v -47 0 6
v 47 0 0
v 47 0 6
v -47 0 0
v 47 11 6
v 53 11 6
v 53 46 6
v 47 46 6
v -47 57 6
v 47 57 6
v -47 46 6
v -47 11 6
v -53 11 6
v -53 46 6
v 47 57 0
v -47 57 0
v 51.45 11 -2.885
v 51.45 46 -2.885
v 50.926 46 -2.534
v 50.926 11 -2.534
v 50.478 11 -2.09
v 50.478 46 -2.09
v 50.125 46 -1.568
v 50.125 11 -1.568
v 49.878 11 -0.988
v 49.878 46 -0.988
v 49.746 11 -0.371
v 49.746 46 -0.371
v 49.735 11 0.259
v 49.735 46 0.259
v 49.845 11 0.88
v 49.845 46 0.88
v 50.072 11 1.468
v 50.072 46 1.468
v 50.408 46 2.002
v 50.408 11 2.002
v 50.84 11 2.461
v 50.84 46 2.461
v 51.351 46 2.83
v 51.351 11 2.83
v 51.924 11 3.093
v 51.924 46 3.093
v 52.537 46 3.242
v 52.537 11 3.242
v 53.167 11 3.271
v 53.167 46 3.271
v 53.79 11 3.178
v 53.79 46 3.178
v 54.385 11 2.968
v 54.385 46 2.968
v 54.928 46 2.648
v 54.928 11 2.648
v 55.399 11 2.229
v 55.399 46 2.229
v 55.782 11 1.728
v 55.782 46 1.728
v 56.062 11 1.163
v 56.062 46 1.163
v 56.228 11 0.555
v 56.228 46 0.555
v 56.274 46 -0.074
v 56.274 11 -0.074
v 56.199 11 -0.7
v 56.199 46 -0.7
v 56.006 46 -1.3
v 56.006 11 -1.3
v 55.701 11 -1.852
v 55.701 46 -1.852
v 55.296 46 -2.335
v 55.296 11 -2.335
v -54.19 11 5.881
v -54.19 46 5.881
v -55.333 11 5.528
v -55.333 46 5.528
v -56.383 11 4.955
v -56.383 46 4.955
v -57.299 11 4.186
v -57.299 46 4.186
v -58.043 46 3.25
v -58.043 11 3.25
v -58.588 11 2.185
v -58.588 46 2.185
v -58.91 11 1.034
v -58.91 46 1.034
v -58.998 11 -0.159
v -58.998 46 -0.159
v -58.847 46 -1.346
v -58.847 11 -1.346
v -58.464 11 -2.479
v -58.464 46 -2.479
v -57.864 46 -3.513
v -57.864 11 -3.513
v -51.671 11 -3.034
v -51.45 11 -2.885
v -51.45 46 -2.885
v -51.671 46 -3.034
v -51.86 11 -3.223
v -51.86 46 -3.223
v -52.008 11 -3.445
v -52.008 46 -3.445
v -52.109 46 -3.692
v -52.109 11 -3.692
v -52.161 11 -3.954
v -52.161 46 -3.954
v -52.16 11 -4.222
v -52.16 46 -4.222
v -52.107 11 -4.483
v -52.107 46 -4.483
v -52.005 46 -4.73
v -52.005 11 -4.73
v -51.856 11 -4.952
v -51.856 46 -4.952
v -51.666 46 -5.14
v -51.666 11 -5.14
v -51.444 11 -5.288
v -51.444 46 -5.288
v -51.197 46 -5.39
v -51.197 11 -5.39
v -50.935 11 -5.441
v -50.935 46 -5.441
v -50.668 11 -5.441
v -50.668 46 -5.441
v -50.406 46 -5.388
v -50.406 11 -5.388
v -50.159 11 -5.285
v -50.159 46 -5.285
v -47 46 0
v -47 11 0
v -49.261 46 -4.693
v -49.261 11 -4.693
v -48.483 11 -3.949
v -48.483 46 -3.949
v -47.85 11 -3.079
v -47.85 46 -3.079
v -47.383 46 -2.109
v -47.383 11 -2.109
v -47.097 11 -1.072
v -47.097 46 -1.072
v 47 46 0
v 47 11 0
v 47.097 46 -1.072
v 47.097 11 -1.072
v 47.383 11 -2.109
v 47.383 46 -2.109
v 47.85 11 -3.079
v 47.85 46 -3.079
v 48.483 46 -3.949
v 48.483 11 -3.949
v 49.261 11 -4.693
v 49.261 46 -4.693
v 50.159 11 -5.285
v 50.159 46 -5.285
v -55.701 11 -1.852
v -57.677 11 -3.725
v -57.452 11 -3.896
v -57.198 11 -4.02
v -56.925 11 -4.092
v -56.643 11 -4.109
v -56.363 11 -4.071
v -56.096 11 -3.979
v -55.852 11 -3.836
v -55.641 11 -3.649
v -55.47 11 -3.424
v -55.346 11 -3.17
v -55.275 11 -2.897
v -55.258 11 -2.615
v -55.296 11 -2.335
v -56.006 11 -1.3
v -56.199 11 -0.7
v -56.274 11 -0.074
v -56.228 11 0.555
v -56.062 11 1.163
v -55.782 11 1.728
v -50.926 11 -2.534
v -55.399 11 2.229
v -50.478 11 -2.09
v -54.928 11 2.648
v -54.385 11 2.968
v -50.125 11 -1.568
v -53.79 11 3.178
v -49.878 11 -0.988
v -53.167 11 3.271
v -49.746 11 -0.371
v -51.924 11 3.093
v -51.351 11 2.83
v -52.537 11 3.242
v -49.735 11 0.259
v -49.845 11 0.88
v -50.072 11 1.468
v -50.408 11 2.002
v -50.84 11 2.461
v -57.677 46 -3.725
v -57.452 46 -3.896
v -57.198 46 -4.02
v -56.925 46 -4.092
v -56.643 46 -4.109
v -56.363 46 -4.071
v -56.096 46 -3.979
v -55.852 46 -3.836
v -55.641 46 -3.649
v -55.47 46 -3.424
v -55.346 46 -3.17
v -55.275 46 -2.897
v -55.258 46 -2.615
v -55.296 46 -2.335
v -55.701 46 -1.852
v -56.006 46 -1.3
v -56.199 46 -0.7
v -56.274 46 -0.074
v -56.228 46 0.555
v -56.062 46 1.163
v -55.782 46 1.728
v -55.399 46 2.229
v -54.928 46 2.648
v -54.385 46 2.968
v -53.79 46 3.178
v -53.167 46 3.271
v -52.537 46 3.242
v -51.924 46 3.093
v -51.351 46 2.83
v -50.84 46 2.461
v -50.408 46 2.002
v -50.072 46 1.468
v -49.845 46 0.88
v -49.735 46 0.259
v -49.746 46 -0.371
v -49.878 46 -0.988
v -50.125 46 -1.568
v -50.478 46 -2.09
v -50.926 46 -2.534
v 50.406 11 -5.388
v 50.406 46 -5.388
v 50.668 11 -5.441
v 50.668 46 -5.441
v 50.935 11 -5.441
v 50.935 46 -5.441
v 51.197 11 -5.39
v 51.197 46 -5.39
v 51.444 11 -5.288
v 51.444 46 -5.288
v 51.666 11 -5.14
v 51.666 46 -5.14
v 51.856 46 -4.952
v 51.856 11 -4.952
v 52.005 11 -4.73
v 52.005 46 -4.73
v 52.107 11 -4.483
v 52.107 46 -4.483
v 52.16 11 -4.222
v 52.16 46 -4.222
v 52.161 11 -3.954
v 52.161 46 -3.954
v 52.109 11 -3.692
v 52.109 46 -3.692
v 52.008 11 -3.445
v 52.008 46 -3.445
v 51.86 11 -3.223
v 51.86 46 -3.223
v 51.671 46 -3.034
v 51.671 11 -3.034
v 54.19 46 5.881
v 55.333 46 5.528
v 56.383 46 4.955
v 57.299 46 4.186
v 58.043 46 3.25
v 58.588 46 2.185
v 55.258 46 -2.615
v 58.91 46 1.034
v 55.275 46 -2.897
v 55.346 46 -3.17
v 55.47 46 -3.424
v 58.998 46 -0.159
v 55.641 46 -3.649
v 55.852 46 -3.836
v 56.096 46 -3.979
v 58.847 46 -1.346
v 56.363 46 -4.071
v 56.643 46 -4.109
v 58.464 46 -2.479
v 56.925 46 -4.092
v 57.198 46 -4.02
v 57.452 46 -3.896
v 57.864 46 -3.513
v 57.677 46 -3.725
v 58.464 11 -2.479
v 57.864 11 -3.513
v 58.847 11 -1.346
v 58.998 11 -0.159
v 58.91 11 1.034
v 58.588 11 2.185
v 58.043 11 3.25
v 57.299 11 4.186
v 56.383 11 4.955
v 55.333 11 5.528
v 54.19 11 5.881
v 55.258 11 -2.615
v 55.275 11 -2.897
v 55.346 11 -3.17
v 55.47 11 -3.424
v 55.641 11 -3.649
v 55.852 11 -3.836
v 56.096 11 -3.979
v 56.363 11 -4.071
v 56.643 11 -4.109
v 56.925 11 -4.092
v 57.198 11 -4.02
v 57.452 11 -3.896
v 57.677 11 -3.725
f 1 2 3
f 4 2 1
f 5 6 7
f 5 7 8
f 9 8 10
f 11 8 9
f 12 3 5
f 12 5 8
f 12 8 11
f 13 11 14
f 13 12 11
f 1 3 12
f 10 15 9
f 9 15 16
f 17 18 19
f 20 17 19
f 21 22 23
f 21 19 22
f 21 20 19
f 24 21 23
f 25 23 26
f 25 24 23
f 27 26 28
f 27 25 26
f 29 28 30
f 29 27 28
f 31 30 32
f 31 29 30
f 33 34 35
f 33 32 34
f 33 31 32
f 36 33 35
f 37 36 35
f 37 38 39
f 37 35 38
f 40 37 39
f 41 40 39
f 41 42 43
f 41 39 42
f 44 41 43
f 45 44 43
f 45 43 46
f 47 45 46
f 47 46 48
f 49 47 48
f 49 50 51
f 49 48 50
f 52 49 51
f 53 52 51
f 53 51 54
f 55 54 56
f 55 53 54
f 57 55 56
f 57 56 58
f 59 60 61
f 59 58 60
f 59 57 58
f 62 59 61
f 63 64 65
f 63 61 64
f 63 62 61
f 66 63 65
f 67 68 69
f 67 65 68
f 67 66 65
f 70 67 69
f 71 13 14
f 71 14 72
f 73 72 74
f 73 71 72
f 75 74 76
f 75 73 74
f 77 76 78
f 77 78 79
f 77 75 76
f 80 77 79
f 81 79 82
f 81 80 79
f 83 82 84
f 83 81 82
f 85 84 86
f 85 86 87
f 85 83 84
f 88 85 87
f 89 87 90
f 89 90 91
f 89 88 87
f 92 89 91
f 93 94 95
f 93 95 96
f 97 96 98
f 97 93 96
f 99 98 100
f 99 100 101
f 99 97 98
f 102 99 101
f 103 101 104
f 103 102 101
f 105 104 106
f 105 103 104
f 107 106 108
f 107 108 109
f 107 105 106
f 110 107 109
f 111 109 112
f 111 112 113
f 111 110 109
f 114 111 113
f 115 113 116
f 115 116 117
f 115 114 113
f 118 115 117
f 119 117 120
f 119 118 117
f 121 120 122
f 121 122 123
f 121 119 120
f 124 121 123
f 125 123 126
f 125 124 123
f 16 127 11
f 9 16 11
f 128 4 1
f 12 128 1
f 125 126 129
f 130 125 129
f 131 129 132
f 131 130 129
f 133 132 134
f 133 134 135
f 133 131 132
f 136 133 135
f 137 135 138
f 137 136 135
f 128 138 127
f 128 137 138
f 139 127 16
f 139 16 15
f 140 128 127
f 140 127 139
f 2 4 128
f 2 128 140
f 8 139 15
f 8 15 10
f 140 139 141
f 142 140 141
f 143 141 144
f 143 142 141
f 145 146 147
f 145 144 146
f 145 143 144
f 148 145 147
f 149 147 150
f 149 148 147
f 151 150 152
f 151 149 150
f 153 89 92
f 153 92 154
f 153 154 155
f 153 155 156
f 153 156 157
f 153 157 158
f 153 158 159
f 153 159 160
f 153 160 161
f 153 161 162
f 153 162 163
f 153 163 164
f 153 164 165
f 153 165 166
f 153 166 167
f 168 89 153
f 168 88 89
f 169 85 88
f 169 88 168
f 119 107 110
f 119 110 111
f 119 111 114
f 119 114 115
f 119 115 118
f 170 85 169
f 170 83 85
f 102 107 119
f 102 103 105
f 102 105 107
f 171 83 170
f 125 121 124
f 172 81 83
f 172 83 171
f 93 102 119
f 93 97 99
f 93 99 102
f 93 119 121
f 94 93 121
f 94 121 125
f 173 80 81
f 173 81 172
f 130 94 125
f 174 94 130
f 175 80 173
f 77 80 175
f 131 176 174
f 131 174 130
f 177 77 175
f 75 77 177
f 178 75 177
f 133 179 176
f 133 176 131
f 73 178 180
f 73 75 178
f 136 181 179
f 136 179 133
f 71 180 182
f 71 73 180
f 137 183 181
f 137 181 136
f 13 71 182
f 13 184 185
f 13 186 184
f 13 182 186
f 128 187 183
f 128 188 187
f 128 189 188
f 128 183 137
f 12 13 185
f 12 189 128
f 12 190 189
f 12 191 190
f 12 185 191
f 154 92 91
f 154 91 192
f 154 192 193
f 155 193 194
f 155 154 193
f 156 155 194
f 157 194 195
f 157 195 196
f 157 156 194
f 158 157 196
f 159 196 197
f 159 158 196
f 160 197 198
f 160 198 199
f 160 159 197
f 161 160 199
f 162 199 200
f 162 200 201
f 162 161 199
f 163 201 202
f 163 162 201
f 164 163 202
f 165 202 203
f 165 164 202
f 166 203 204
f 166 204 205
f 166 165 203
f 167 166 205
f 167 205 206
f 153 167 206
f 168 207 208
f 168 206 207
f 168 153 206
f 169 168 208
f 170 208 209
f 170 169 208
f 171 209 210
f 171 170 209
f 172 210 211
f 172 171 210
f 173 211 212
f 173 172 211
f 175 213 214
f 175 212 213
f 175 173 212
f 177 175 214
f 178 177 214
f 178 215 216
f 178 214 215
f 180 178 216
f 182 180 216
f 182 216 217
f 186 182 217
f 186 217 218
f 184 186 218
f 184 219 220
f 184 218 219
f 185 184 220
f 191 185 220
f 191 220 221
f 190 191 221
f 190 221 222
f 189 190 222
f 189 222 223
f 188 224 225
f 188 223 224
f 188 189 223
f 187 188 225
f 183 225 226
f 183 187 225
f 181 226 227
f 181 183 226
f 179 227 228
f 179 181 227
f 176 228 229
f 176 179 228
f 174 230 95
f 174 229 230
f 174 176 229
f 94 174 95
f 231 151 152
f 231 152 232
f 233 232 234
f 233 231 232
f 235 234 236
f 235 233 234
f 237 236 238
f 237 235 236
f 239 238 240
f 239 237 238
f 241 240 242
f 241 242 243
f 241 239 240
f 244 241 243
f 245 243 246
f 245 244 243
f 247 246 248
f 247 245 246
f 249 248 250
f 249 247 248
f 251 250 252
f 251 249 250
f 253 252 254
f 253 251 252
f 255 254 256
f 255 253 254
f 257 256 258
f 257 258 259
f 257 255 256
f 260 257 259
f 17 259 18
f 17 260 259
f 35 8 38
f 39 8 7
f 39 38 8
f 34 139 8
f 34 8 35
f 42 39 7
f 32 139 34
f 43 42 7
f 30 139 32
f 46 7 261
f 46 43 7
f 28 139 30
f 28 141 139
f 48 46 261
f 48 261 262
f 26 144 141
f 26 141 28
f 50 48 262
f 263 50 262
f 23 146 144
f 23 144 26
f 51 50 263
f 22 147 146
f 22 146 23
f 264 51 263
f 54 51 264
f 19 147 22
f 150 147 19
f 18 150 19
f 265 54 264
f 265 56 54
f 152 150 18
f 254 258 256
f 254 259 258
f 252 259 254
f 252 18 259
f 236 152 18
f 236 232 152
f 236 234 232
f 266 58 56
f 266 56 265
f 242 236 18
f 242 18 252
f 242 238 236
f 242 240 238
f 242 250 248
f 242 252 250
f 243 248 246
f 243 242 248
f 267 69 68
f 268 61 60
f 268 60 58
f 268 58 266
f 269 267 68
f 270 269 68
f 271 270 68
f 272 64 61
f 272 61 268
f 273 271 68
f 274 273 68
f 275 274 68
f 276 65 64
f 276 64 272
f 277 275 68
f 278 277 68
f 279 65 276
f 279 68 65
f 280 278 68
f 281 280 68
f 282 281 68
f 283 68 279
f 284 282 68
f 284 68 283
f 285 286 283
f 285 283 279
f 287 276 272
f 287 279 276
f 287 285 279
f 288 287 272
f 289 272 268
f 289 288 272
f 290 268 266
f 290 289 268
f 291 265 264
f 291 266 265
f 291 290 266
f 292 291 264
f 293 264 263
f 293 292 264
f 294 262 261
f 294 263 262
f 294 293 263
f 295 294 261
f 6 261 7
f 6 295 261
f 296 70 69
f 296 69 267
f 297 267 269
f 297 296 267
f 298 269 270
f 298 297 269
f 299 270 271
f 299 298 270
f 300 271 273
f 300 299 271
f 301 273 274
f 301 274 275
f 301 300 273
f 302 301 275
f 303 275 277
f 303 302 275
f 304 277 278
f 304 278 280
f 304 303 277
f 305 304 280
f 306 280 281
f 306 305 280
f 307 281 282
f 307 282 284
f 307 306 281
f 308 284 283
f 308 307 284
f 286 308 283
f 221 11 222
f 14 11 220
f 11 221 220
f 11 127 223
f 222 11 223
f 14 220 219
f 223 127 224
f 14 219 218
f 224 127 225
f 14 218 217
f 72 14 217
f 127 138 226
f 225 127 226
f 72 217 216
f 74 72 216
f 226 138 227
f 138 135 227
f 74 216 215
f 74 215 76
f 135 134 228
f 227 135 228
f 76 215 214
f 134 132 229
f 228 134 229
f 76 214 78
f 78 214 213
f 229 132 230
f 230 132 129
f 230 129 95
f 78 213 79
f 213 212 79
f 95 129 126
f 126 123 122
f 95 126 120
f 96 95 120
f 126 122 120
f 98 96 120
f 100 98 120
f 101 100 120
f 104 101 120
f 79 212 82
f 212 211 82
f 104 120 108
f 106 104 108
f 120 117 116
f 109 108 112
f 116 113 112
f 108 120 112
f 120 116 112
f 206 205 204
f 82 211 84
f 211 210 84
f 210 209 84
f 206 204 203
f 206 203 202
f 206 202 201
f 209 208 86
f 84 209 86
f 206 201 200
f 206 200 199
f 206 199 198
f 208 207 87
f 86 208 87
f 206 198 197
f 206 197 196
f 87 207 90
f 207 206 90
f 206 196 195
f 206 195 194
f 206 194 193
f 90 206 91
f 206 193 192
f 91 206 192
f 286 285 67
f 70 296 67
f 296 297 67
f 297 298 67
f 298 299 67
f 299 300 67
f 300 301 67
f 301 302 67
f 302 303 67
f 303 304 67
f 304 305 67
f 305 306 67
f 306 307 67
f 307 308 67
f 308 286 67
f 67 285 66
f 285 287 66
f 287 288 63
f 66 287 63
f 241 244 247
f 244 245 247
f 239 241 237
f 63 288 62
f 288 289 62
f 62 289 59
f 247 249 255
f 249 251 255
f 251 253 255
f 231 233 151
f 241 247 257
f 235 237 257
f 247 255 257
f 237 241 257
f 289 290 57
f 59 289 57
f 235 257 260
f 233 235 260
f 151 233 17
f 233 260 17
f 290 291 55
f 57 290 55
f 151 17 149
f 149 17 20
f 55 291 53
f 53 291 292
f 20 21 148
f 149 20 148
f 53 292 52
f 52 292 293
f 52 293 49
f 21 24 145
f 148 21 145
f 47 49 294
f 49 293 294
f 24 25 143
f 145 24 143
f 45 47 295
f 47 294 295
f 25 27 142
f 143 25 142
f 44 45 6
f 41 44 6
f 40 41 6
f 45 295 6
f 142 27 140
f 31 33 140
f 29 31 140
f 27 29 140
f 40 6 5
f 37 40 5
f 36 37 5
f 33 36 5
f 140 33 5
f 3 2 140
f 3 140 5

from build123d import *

# Parameters (mm, degrees)
RESSALTO_EXTRUS_O1_DEPTH = 57
CORTE_EXTRUS_O1_START    = -11
CORTE_EXTRUS_O1_DEPTH    = 11
CORTE_EXTRUS_O2_DEPTH    = 11


with BuildPart() as part:
    # Esboço1 → Ressalto-extrusão1 (new body)
    with BuildSketch(Plane(origin=(0, 0, 0), x_dir=(1, 0, 0), z_dir=(0, 1, 0))):
        with BuildLine():
            Line((-47, 0), (47, 0))
            ThreePointArc((47, 0), (47.85009345, 3.078711179), (50.159487509, 5.285024956))
            ThreePointArc((50.159487509, 5.285024956), (52.004661638, 4.729916917), (51.449553599, 2.884742789))
            ThreePointArc((51.449553599, 2.884742789), (52.536782743, -3.242075689), (55.296246294, 2.335139815))
            ThreePointArc((55.296246294, 2.335139815), (56.096189798, 3.978813584), (57.863892701, 3.513196237))
            ThreePointArc((57.863892701, 3.513196237), (58.342245662, -2.731375348), (53, -6))
            Line((53, -6), (-53, -6))
            ThreePointArc((-53, -6), (-58.342245662, -2.731375348), (-57.863892701, 3.513196237))
            ThreePointArc((-57.863892701, 3.513196237), (-56.096189798, 3.978813584), (-55.296246294, 2.335139815))
            ThreePointArc((-55.296246294, 2.335139815), (-52.536782743, -3.242075689), (-51.449553599, 2.884742789))
            ThreePointArc((-51.449553599, 2.884742789), (-52.004661638, 4.729916917), (-50.159487509, 5.285024956))
            ThreePointArc((-50.159487509, 5.285024956), (-47.85009345, 3.078711179), (-47, 0))
        make_face()
    extrude(amount=RESSALTO_EXTRUS_O1_DEPTH)

    # Esboço2 → Corte-extrusão1 (cut)
    with BuildSketch(Plane(origin=(0, 57, 0), x_dir=(1, 0, 0), z_dir=(0, 1, 0)).offset(CORTE_EXTRUS_O1_START)):
        with BuildLine():
            Line((47, 0), (47, -6))
            Line((47, -6), (53, -6))
            ThreePointArc((53, -6), (57.242640687, 4.242640687), (47, 0))
        make_face()
        with BuildLine():
            Line((-47, 0), (-47, -6))
            Line((-47, -6), (-53, -6))
            ThreePointArc((-53, -6), (-57.242640687, 4.242640687), (-47, 0))
        make_face()
    extrude(amount=CORTE_EXTRUS_O1_DEPTH, mode=Mode.SUBTRACT)

    # Esboço3 → Corte-extrusão2 (cut)
    with BuildSketch(Plane.XZ):
        with BuildLine():
            Line((-47, 0), (-47, 6))
            Line((-47, 6), (-53, 6))
            ThreePointArc((-53, 6), (-57.242640687, -4.242640687), (-47, 0))
        make_face()
        with BuildLine():
            Line((47, 0), (47, 6))
            Line((47, 6), (53, 6))
            ThreePointArc((53, 6), (57.242640687, -4.242640687), (47, 0))
        make_face()
    extrude(amount=-CORTE_EXTRUS_O2_DEPTH, mode=Mode.SUBTRACT)


solid = part.part
